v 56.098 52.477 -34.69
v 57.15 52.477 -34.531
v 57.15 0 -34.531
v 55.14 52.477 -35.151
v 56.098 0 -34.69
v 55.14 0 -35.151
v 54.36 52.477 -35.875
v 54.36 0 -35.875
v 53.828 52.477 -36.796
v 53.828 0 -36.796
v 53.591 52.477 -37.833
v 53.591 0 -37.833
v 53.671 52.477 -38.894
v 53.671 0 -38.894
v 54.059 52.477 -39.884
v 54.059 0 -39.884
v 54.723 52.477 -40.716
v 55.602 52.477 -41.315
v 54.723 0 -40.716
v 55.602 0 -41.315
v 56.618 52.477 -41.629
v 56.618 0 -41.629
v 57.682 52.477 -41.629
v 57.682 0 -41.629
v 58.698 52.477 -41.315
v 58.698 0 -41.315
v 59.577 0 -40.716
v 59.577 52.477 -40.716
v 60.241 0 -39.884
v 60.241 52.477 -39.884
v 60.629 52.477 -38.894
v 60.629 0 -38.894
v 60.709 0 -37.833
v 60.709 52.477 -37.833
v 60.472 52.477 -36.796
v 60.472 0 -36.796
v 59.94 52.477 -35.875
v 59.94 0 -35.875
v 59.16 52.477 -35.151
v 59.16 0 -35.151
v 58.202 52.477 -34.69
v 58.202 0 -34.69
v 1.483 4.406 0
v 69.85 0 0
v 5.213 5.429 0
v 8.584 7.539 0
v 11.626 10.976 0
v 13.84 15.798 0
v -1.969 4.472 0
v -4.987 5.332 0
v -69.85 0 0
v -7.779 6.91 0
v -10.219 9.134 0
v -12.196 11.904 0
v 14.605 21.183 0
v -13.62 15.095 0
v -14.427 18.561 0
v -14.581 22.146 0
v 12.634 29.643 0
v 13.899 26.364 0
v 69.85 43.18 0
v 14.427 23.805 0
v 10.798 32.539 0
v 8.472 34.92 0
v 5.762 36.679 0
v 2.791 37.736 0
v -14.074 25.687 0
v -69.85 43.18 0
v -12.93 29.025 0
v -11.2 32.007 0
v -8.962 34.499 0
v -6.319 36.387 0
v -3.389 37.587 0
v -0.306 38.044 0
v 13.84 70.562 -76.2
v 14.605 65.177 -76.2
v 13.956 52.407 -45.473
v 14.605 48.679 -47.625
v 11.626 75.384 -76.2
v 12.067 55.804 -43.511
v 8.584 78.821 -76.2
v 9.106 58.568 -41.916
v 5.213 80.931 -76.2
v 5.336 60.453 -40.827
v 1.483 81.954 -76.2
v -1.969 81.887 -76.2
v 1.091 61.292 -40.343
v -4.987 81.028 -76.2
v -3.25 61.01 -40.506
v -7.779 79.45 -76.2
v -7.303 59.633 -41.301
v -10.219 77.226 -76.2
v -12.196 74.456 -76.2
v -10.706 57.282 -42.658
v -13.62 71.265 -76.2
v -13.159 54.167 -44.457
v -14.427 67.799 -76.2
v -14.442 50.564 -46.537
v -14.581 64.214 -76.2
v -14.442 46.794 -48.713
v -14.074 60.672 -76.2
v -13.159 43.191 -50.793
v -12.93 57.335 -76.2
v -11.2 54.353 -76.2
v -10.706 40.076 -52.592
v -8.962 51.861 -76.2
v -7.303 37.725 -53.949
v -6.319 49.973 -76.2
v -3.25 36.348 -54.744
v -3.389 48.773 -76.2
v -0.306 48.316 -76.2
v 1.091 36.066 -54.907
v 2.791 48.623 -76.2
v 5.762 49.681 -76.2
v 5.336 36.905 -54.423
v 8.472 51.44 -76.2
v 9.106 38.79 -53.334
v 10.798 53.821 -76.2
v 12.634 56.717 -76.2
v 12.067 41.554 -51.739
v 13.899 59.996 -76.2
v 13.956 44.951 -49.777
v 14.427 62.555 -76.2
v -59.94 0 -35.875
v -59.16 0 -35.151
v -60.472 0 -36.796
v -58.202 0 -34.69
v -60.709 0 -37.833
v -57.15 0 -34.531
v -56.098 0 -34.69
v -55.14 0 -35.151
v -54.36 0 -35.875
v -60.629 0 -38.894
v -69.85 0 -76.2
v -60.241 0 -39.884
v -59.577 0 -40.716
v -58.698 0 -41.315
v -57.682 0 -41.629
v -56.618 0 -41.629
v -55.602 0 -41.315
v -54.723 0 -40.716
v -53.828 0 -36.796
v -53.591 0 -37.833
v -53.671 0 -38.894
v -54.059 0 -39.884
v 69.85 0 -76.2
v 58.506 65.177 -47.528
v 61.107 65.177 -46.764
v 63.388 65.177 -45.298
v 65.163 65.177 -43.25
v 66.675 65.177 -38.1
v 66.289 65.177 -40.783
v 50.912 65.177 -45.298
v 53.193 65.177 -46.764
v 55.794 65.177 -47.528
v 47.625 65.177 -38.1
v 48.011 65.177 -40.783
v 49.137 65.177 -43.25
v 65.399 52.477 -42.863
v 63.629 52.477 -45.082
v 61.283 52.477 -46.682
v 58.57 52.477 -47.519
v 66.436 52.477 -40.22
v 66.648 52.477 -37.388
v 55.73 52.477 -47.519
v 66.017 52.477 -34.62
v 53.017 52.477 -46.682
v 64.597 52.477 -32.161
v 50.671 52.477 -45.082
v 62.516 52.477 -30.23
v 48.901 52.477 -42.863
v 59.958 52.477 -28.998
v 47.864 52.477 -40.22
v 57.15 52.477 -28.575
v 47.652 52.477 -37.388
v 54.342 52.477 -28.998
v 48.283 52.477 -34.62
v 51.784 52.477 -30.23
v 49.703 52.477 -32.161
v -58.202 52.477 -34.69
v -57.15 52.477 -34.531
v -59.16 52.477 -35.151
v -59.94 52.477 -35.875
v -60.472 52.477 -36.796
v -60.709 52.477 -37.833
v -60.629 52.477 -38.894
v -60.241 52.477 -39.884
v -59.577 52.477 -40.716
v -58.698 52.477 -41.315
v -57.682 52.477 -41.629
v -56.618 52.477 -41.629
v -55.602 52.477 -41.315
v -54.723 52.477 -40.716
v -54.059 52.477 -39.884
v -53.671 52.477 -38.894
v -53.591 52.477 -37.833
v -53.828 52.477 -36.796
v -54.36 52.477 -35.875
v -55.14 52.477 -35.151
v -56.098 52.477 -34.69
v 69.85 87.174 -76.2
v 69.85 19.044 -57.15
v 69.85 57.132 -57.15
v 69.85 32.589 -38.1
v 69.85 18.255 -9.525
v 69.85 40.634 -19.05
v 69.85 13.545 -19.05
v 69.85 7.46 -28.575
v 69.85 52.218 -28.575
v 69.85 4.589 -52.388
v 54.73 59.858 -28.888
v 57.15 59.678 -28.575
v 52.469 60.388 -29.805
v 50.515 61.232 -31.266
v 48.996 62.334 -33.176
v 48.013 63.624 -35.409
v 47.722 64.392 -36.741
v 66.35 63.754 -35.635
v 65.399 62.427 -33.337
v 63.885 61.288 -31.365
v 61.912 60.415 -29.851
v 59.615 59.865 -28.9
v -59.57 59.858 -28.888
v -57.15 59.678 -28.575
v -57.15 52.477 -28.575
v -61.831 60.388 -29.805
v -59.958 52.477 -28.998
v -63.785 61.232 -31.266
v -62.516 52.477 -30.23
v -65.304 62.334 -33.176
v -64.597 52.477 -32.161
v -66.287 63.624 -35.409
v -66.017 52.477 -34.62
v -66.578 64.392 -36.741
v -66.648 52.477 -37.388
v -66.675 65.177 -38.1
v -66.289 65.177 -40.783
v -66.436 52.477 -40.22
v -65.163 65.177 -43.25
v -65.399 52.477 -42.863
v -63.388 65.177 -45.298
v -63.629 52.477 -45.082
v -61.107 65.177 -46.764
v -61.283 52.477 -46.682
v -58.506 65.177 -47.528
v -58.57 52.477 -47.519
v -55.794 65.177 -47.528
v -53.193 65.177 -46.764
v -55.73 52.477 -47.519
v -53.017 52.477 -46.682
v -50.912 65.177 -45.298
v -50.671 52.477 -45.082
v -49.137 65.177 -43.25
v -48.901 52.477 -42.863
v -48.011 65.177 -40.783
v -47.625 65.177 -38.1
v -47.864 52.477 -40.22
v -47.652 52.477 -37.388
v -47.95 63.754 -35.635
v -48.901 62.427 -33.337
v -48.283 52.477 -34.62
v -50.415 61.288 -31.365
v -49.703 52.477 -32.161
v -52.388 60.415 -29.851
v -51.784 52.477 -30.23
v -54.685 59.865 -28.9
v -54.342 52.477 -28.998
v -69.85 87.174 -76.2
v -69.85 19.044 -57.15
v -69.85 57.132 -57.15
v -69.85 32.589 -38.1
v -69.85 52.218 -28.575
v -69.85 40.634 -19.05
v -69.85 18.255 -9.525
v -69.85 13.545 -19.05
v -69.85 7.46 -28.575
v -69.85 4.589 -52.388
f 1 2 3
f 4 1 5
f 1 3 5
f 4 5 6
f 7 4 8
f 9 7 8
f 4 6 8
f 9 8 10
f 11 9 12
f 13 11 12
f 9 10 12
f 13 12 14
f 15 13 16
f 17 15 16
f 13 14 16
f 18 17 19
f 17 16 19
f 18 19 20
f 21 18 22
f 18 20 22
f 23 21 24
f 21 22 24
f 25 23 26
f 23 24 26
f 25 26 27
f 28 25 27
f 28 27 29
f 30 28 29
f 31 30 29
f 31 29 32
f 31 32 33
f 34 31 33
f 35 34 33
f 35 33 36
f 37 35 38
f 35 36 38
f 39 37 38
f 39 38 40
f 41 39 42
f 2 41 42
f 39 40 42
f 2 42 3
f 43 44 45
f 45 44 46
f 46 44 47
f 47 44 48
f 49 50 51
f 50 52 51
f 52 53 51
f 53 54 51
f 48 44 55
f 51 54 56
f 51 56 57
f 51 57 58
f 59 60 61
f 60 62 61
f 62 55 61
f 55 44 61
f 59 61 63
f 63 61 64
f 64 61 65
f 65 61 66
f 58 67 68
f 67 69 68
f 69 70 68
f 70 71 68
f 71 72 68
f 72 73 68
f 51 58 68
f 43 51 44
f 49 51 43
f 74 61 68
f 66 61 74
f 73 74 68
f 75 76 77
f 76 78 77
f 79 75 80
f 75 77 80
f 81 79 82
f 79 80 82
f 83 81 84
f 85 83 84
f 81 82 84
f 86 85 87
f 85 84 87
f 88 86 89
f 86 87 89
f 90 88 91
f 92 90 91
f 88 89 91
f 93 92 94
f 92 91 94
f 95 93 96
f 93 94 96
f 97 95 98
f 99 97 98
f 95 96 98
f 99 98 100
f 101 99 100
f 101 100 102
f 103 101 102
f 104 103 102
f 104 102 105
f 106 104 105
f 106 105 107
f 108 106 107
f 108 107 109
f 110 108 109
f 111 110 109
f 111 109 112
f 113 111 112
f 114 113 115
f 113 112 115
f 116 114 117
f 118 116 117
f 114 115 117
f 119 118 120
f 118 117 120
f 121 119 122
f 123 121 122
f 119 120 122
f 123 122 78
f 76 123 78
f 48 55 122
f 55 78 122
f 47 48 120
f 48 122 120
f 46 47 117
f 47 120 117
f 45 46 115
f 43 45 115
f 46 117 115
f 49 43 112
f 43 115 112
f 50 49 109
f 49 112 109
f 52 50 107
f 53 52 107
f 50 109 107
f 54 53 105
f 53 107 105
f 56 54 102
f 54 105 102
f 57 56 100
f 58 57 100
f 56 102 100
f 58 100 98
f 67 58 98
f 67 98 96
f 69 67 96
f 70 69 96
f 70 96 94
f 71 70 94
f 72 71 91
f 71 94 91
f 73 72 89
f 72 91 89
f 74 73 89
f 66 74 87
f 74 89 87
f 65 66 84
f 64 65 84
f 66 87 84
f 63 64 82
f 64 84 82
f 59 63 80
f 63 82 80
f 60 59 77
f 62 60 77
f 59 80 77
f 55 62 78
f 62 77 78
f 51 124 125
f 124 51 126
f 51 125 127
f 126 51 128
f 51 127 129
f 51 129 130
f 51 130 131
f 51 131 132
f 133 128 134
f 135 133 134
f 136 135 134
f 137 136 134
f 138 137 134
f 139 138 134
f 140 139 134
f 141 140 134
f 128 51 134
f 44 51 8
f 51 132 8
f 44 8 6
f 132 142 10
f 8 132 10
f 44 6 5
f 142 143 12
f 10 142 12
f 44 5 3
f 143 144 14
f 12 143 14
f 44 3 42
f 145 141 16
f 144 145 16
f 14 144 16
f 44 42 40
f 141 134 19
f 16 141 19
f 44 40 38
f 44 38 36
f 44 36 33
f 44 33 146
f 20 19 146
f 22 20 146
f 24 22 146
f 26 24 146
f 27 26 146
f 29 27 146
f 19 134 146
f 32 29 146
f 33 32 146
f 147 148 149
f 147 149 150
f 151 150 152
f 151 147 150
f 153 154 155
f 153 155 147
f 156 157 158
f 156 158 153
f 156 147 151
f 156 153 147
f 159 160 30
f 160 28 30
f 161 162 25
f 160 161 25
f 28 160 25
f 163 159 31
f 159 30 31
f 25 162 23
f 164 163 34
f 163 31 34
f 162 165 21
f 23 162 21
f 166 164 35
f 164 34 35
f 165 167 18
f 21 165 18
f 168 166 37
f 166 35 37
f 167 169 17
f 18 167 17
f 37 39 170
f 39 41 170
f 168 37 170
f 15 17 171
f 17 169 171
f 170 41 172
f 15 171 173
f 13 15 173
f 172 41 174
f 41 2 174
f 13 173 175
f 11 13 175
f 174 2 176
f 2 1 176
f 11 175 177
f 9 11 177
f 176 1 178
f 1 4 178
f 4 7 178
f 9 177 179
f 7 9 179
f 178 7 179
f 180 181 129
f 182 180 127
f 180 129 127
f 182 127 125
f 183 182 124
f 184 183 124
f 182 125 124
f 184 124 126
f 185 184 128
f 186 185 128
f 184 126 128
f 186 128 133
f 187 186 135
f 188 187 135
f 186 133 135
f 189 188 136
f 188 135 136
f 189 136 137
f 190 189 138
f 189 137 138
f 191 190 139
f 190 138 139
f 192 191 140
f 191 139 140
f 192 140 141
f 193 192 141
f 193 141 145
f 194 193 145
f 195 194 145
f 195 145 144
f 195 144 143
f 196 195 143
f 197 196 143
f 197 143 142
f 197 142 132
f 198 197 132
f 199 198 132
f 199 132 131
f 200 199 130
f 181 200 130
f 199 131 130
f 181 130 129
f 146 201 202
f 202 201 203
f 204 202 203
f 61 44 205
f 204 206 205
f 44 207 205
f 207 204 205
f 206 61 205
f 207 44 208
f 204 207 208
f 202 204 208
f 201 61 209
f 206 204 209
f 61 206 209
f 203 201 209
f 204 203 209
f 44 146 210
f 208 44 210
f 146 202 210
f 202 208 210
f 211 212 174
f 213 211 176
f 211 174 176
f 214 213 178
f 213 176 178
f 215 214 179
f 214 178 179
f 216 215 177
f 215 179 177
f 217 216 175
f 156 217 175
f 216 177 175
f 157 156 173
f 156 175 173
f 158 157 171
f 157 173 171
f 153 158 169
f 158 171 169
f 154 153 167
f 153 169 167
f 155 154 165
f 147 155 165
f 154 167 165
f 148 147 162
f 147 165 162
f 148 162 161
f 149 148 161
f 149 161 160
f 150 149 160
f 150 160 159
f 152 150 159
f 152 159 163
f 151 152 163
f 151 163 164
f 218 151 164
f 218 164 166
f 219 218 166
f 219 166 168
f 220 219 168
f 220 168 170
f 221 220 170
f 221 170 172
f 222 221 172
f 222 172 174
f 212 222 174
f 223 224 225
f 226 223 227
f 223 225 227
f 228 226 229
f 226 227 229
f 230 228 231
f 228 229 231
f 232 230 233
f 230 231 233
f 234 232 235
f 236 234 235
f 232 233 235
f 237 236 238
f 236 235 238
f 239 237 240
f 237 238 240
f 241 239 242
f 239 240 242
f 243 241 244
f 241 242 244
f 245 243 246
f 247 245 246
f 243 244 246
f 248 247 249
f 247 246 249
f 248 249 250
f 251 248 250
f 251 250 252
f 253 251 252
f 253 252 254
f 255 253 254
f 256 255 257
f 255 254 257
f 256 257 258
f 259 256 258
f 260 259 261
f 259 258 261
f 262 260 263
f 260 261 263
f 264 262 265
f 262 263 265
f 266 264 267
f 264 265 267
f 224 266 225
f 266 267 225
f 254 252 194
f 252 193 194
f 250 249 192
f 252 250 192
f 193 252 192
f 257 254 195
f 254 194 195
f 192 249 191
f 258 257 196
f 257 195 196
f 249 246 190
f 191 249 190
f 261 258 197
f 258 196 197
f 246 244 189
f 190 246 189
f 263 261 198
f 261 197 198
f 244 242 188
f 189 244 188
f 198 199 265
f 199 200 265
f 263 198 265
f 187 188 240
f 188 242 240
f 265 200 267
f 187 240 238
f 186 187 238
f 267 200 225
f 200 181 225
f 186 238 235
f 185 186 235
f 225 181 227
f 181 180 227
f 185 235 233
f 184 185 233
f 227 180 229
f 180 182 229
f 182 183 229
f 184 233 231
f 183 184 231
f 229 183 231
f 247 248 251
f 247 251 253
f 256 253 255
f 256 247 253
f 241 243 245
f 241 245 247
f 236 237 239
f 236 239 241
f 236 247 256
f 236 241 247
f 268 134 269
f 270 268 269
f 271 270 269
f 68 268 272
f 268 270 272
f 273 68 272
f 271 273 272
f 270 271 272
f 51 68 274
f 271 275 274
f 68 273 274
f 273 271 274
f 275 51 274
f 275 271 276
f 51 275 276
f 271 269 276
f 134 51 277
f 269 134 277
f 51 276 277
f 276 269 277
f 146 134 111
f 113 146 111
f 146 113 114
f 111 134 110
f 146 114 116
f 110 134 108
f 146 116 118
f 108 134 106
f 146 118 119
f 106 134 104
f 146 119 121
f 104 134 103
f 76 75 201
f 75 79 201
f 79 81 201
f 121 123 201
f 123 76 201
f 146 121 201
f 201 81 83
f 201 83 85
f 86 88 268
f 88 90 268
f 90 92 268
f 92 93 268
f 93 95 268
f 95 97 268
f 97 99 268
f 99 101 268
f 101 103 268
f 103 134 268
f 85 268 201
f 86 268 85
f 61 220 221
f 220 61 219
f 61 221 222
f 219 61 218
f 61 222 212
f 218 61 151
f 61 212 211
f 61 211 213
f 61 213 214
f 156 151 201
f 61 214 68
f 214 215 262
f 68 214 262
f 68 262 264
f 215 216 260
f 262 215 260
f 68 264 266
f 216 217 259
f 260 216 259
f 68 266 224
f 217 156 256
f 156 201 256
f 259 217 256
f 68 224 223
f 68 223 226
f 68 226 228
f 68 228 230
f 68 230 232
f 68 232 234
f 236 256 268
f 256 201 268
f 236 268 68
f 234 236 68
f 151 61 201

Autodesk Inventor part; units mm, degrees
ref_plane "YZ Plane" through (0, 0, 0) normal (1, 0, 0) x (0, 1, 0)
sketch "Sketch2" plane through (0, 0, 0) normal (0, 0, 1) x (1, 0, 0)
  line L0 (0, 0) -> (69.85, 0)
  line L1 (69.85, 0) -> (69.85, 43.18)
  line L2 (69.85, 43.18) -> (0, 43.18)
  line L3 (0, 0) -> (0, 43.18) construction
  line L4 (0, 0) -> (-69.85, 0)
  line L5 (-69.85, 0) -> (-69.85, 43.18)
  line L6 (-69.85, 43.18) -> (0, 43.18)
  dimension "d2" = 69.85
  dimension "frontHeight" = 43.18
ref_plane "Work Plane1" through (0, 0, -76.2) normal (0, 0, 1) x (1, 0, 0)
sketch "Sketch3" plane through (0, 0, -76.2) normal (0, 0, 1) x (1, 0, 0)
  line L0 (0, 0) -> (69.85, 0)
  line L1 (69.85, 0) -> (69.85, 87.1741)
  line L2 (69.85, 87.1741) -> (0, 87.1741)
  line L3 (0, 0) -> (0, 87.1741) construction
  line L4 (0, 0) -> (-69.85, 0)
  line L5 (-69.85, 0) -> (-69.85, 87.1741)
  line L6 (-69.85, 87.1741) -> (0, 87.1741)
  dimension "d5" = 69.85
  dimension "rearHeight" = 87.1741
loft "Loft1" add profiles "Sketch2", "Sketch3"
sketch "Sketch4" plane through (69.85, 0, -76.2) normal (1, 0, 0) x (0, 0, -1)
  line L0 (-76.2, 43.18) -> (0, 87.1741) construction
  line L1 (-76.2, 43.18) -> (0, 43.18) construction
  line L2 (0, 0) -> (0, 87.1741) construction
  point P0 (-76.2, 0)
  dimension "d11" = 30
sketch "Sketch5" plane through (-69.85, 43.18, 0) normal (0, 0.866, 0.5) x (1, 0, 0)
  line L0 (0, 0) -> (0, 87.9882) construction
  line L1 (0, 43.9941) -> (139.7, 43.9941) construction
  line L2 (139.7, 0) -> (139.7, 87.9882) construction
  point P0 (69.85, -21.59)
ref_plane "Work Plane2" through (-69.85, 65.177, -38.1) normal (0, -0.5, 0.866) x (1, 0, 0)
sketch "Sketch6" plane through (-69.85, 65.177, -38.1) normal (0, -0.5, 0.866) x (1, 0, 0)
  circle A0 centre (69.85, -19.05) radius 14.605
  line L0 (139.7, 0) -> (0, 0) projected
  point P0 (69.85, -37.395)
  dimension "holeDiameter" = 29.21
  dimension "centerLineForHole" = 19.05
extrude "Extrusion1" cut sketch "Sketch6" along normal through all both and the other way through all
ref_plane "centerLineForHoleWork Plane" through (-69.85, 26.6822, -9.525) normal (0, 0.866, 0.5) x (1, 0, 0)
ref_plane "screwHoleWork Plane" through (69.85, 65.177, -38.1) normal (0, 1, 0) x (-1, 0, 0)
sketch "Sketch7" plane through (69.85, 65.177, -38.1) normal (0, 1, 0) x (-1, 0, 0)
  line L0 (0, -38.1) -> (139.7, -38.1) construction
  line L1 (69.85, -38.1) -> (69.85, 38.1) construction
  point P0 (127, 0)
  point P1 (12.7, 0)
  dimension "d18" = 57.15
  dimension "d19" = 57.15
hole "Hole1" at (-57.15, 65.177, -38.1) at (57.15, 65.177, -38.1) direction (0, -1, 0) diameter 7.1374 end through all counterbore diameter 19.05 counterbore depth 12.7 clearance for "Hex Head Bolt" size "1/4" standard "Ansi Unified Screw Threads"
equation "\"d2\" = 0.5 * width"
equation "\"d5\" = 0.5 * width"
equation "\"rearHeight\" = frontHeight + 0.57735 * depth"
equation "\"d18\" = holeDistanceFromCenter"
equation "\"d19\" = holeDistanceFromCenter"
equation "\"width\" = 139.7"
equation "\"d4\" = -depth"
equation "\"depth\" = 76.2"
equation "\"d17\" = -centerLineForHole"
equation "\"holeDistanceFromCenter\" = 57.15"
properties part number "swallowMountV02"
